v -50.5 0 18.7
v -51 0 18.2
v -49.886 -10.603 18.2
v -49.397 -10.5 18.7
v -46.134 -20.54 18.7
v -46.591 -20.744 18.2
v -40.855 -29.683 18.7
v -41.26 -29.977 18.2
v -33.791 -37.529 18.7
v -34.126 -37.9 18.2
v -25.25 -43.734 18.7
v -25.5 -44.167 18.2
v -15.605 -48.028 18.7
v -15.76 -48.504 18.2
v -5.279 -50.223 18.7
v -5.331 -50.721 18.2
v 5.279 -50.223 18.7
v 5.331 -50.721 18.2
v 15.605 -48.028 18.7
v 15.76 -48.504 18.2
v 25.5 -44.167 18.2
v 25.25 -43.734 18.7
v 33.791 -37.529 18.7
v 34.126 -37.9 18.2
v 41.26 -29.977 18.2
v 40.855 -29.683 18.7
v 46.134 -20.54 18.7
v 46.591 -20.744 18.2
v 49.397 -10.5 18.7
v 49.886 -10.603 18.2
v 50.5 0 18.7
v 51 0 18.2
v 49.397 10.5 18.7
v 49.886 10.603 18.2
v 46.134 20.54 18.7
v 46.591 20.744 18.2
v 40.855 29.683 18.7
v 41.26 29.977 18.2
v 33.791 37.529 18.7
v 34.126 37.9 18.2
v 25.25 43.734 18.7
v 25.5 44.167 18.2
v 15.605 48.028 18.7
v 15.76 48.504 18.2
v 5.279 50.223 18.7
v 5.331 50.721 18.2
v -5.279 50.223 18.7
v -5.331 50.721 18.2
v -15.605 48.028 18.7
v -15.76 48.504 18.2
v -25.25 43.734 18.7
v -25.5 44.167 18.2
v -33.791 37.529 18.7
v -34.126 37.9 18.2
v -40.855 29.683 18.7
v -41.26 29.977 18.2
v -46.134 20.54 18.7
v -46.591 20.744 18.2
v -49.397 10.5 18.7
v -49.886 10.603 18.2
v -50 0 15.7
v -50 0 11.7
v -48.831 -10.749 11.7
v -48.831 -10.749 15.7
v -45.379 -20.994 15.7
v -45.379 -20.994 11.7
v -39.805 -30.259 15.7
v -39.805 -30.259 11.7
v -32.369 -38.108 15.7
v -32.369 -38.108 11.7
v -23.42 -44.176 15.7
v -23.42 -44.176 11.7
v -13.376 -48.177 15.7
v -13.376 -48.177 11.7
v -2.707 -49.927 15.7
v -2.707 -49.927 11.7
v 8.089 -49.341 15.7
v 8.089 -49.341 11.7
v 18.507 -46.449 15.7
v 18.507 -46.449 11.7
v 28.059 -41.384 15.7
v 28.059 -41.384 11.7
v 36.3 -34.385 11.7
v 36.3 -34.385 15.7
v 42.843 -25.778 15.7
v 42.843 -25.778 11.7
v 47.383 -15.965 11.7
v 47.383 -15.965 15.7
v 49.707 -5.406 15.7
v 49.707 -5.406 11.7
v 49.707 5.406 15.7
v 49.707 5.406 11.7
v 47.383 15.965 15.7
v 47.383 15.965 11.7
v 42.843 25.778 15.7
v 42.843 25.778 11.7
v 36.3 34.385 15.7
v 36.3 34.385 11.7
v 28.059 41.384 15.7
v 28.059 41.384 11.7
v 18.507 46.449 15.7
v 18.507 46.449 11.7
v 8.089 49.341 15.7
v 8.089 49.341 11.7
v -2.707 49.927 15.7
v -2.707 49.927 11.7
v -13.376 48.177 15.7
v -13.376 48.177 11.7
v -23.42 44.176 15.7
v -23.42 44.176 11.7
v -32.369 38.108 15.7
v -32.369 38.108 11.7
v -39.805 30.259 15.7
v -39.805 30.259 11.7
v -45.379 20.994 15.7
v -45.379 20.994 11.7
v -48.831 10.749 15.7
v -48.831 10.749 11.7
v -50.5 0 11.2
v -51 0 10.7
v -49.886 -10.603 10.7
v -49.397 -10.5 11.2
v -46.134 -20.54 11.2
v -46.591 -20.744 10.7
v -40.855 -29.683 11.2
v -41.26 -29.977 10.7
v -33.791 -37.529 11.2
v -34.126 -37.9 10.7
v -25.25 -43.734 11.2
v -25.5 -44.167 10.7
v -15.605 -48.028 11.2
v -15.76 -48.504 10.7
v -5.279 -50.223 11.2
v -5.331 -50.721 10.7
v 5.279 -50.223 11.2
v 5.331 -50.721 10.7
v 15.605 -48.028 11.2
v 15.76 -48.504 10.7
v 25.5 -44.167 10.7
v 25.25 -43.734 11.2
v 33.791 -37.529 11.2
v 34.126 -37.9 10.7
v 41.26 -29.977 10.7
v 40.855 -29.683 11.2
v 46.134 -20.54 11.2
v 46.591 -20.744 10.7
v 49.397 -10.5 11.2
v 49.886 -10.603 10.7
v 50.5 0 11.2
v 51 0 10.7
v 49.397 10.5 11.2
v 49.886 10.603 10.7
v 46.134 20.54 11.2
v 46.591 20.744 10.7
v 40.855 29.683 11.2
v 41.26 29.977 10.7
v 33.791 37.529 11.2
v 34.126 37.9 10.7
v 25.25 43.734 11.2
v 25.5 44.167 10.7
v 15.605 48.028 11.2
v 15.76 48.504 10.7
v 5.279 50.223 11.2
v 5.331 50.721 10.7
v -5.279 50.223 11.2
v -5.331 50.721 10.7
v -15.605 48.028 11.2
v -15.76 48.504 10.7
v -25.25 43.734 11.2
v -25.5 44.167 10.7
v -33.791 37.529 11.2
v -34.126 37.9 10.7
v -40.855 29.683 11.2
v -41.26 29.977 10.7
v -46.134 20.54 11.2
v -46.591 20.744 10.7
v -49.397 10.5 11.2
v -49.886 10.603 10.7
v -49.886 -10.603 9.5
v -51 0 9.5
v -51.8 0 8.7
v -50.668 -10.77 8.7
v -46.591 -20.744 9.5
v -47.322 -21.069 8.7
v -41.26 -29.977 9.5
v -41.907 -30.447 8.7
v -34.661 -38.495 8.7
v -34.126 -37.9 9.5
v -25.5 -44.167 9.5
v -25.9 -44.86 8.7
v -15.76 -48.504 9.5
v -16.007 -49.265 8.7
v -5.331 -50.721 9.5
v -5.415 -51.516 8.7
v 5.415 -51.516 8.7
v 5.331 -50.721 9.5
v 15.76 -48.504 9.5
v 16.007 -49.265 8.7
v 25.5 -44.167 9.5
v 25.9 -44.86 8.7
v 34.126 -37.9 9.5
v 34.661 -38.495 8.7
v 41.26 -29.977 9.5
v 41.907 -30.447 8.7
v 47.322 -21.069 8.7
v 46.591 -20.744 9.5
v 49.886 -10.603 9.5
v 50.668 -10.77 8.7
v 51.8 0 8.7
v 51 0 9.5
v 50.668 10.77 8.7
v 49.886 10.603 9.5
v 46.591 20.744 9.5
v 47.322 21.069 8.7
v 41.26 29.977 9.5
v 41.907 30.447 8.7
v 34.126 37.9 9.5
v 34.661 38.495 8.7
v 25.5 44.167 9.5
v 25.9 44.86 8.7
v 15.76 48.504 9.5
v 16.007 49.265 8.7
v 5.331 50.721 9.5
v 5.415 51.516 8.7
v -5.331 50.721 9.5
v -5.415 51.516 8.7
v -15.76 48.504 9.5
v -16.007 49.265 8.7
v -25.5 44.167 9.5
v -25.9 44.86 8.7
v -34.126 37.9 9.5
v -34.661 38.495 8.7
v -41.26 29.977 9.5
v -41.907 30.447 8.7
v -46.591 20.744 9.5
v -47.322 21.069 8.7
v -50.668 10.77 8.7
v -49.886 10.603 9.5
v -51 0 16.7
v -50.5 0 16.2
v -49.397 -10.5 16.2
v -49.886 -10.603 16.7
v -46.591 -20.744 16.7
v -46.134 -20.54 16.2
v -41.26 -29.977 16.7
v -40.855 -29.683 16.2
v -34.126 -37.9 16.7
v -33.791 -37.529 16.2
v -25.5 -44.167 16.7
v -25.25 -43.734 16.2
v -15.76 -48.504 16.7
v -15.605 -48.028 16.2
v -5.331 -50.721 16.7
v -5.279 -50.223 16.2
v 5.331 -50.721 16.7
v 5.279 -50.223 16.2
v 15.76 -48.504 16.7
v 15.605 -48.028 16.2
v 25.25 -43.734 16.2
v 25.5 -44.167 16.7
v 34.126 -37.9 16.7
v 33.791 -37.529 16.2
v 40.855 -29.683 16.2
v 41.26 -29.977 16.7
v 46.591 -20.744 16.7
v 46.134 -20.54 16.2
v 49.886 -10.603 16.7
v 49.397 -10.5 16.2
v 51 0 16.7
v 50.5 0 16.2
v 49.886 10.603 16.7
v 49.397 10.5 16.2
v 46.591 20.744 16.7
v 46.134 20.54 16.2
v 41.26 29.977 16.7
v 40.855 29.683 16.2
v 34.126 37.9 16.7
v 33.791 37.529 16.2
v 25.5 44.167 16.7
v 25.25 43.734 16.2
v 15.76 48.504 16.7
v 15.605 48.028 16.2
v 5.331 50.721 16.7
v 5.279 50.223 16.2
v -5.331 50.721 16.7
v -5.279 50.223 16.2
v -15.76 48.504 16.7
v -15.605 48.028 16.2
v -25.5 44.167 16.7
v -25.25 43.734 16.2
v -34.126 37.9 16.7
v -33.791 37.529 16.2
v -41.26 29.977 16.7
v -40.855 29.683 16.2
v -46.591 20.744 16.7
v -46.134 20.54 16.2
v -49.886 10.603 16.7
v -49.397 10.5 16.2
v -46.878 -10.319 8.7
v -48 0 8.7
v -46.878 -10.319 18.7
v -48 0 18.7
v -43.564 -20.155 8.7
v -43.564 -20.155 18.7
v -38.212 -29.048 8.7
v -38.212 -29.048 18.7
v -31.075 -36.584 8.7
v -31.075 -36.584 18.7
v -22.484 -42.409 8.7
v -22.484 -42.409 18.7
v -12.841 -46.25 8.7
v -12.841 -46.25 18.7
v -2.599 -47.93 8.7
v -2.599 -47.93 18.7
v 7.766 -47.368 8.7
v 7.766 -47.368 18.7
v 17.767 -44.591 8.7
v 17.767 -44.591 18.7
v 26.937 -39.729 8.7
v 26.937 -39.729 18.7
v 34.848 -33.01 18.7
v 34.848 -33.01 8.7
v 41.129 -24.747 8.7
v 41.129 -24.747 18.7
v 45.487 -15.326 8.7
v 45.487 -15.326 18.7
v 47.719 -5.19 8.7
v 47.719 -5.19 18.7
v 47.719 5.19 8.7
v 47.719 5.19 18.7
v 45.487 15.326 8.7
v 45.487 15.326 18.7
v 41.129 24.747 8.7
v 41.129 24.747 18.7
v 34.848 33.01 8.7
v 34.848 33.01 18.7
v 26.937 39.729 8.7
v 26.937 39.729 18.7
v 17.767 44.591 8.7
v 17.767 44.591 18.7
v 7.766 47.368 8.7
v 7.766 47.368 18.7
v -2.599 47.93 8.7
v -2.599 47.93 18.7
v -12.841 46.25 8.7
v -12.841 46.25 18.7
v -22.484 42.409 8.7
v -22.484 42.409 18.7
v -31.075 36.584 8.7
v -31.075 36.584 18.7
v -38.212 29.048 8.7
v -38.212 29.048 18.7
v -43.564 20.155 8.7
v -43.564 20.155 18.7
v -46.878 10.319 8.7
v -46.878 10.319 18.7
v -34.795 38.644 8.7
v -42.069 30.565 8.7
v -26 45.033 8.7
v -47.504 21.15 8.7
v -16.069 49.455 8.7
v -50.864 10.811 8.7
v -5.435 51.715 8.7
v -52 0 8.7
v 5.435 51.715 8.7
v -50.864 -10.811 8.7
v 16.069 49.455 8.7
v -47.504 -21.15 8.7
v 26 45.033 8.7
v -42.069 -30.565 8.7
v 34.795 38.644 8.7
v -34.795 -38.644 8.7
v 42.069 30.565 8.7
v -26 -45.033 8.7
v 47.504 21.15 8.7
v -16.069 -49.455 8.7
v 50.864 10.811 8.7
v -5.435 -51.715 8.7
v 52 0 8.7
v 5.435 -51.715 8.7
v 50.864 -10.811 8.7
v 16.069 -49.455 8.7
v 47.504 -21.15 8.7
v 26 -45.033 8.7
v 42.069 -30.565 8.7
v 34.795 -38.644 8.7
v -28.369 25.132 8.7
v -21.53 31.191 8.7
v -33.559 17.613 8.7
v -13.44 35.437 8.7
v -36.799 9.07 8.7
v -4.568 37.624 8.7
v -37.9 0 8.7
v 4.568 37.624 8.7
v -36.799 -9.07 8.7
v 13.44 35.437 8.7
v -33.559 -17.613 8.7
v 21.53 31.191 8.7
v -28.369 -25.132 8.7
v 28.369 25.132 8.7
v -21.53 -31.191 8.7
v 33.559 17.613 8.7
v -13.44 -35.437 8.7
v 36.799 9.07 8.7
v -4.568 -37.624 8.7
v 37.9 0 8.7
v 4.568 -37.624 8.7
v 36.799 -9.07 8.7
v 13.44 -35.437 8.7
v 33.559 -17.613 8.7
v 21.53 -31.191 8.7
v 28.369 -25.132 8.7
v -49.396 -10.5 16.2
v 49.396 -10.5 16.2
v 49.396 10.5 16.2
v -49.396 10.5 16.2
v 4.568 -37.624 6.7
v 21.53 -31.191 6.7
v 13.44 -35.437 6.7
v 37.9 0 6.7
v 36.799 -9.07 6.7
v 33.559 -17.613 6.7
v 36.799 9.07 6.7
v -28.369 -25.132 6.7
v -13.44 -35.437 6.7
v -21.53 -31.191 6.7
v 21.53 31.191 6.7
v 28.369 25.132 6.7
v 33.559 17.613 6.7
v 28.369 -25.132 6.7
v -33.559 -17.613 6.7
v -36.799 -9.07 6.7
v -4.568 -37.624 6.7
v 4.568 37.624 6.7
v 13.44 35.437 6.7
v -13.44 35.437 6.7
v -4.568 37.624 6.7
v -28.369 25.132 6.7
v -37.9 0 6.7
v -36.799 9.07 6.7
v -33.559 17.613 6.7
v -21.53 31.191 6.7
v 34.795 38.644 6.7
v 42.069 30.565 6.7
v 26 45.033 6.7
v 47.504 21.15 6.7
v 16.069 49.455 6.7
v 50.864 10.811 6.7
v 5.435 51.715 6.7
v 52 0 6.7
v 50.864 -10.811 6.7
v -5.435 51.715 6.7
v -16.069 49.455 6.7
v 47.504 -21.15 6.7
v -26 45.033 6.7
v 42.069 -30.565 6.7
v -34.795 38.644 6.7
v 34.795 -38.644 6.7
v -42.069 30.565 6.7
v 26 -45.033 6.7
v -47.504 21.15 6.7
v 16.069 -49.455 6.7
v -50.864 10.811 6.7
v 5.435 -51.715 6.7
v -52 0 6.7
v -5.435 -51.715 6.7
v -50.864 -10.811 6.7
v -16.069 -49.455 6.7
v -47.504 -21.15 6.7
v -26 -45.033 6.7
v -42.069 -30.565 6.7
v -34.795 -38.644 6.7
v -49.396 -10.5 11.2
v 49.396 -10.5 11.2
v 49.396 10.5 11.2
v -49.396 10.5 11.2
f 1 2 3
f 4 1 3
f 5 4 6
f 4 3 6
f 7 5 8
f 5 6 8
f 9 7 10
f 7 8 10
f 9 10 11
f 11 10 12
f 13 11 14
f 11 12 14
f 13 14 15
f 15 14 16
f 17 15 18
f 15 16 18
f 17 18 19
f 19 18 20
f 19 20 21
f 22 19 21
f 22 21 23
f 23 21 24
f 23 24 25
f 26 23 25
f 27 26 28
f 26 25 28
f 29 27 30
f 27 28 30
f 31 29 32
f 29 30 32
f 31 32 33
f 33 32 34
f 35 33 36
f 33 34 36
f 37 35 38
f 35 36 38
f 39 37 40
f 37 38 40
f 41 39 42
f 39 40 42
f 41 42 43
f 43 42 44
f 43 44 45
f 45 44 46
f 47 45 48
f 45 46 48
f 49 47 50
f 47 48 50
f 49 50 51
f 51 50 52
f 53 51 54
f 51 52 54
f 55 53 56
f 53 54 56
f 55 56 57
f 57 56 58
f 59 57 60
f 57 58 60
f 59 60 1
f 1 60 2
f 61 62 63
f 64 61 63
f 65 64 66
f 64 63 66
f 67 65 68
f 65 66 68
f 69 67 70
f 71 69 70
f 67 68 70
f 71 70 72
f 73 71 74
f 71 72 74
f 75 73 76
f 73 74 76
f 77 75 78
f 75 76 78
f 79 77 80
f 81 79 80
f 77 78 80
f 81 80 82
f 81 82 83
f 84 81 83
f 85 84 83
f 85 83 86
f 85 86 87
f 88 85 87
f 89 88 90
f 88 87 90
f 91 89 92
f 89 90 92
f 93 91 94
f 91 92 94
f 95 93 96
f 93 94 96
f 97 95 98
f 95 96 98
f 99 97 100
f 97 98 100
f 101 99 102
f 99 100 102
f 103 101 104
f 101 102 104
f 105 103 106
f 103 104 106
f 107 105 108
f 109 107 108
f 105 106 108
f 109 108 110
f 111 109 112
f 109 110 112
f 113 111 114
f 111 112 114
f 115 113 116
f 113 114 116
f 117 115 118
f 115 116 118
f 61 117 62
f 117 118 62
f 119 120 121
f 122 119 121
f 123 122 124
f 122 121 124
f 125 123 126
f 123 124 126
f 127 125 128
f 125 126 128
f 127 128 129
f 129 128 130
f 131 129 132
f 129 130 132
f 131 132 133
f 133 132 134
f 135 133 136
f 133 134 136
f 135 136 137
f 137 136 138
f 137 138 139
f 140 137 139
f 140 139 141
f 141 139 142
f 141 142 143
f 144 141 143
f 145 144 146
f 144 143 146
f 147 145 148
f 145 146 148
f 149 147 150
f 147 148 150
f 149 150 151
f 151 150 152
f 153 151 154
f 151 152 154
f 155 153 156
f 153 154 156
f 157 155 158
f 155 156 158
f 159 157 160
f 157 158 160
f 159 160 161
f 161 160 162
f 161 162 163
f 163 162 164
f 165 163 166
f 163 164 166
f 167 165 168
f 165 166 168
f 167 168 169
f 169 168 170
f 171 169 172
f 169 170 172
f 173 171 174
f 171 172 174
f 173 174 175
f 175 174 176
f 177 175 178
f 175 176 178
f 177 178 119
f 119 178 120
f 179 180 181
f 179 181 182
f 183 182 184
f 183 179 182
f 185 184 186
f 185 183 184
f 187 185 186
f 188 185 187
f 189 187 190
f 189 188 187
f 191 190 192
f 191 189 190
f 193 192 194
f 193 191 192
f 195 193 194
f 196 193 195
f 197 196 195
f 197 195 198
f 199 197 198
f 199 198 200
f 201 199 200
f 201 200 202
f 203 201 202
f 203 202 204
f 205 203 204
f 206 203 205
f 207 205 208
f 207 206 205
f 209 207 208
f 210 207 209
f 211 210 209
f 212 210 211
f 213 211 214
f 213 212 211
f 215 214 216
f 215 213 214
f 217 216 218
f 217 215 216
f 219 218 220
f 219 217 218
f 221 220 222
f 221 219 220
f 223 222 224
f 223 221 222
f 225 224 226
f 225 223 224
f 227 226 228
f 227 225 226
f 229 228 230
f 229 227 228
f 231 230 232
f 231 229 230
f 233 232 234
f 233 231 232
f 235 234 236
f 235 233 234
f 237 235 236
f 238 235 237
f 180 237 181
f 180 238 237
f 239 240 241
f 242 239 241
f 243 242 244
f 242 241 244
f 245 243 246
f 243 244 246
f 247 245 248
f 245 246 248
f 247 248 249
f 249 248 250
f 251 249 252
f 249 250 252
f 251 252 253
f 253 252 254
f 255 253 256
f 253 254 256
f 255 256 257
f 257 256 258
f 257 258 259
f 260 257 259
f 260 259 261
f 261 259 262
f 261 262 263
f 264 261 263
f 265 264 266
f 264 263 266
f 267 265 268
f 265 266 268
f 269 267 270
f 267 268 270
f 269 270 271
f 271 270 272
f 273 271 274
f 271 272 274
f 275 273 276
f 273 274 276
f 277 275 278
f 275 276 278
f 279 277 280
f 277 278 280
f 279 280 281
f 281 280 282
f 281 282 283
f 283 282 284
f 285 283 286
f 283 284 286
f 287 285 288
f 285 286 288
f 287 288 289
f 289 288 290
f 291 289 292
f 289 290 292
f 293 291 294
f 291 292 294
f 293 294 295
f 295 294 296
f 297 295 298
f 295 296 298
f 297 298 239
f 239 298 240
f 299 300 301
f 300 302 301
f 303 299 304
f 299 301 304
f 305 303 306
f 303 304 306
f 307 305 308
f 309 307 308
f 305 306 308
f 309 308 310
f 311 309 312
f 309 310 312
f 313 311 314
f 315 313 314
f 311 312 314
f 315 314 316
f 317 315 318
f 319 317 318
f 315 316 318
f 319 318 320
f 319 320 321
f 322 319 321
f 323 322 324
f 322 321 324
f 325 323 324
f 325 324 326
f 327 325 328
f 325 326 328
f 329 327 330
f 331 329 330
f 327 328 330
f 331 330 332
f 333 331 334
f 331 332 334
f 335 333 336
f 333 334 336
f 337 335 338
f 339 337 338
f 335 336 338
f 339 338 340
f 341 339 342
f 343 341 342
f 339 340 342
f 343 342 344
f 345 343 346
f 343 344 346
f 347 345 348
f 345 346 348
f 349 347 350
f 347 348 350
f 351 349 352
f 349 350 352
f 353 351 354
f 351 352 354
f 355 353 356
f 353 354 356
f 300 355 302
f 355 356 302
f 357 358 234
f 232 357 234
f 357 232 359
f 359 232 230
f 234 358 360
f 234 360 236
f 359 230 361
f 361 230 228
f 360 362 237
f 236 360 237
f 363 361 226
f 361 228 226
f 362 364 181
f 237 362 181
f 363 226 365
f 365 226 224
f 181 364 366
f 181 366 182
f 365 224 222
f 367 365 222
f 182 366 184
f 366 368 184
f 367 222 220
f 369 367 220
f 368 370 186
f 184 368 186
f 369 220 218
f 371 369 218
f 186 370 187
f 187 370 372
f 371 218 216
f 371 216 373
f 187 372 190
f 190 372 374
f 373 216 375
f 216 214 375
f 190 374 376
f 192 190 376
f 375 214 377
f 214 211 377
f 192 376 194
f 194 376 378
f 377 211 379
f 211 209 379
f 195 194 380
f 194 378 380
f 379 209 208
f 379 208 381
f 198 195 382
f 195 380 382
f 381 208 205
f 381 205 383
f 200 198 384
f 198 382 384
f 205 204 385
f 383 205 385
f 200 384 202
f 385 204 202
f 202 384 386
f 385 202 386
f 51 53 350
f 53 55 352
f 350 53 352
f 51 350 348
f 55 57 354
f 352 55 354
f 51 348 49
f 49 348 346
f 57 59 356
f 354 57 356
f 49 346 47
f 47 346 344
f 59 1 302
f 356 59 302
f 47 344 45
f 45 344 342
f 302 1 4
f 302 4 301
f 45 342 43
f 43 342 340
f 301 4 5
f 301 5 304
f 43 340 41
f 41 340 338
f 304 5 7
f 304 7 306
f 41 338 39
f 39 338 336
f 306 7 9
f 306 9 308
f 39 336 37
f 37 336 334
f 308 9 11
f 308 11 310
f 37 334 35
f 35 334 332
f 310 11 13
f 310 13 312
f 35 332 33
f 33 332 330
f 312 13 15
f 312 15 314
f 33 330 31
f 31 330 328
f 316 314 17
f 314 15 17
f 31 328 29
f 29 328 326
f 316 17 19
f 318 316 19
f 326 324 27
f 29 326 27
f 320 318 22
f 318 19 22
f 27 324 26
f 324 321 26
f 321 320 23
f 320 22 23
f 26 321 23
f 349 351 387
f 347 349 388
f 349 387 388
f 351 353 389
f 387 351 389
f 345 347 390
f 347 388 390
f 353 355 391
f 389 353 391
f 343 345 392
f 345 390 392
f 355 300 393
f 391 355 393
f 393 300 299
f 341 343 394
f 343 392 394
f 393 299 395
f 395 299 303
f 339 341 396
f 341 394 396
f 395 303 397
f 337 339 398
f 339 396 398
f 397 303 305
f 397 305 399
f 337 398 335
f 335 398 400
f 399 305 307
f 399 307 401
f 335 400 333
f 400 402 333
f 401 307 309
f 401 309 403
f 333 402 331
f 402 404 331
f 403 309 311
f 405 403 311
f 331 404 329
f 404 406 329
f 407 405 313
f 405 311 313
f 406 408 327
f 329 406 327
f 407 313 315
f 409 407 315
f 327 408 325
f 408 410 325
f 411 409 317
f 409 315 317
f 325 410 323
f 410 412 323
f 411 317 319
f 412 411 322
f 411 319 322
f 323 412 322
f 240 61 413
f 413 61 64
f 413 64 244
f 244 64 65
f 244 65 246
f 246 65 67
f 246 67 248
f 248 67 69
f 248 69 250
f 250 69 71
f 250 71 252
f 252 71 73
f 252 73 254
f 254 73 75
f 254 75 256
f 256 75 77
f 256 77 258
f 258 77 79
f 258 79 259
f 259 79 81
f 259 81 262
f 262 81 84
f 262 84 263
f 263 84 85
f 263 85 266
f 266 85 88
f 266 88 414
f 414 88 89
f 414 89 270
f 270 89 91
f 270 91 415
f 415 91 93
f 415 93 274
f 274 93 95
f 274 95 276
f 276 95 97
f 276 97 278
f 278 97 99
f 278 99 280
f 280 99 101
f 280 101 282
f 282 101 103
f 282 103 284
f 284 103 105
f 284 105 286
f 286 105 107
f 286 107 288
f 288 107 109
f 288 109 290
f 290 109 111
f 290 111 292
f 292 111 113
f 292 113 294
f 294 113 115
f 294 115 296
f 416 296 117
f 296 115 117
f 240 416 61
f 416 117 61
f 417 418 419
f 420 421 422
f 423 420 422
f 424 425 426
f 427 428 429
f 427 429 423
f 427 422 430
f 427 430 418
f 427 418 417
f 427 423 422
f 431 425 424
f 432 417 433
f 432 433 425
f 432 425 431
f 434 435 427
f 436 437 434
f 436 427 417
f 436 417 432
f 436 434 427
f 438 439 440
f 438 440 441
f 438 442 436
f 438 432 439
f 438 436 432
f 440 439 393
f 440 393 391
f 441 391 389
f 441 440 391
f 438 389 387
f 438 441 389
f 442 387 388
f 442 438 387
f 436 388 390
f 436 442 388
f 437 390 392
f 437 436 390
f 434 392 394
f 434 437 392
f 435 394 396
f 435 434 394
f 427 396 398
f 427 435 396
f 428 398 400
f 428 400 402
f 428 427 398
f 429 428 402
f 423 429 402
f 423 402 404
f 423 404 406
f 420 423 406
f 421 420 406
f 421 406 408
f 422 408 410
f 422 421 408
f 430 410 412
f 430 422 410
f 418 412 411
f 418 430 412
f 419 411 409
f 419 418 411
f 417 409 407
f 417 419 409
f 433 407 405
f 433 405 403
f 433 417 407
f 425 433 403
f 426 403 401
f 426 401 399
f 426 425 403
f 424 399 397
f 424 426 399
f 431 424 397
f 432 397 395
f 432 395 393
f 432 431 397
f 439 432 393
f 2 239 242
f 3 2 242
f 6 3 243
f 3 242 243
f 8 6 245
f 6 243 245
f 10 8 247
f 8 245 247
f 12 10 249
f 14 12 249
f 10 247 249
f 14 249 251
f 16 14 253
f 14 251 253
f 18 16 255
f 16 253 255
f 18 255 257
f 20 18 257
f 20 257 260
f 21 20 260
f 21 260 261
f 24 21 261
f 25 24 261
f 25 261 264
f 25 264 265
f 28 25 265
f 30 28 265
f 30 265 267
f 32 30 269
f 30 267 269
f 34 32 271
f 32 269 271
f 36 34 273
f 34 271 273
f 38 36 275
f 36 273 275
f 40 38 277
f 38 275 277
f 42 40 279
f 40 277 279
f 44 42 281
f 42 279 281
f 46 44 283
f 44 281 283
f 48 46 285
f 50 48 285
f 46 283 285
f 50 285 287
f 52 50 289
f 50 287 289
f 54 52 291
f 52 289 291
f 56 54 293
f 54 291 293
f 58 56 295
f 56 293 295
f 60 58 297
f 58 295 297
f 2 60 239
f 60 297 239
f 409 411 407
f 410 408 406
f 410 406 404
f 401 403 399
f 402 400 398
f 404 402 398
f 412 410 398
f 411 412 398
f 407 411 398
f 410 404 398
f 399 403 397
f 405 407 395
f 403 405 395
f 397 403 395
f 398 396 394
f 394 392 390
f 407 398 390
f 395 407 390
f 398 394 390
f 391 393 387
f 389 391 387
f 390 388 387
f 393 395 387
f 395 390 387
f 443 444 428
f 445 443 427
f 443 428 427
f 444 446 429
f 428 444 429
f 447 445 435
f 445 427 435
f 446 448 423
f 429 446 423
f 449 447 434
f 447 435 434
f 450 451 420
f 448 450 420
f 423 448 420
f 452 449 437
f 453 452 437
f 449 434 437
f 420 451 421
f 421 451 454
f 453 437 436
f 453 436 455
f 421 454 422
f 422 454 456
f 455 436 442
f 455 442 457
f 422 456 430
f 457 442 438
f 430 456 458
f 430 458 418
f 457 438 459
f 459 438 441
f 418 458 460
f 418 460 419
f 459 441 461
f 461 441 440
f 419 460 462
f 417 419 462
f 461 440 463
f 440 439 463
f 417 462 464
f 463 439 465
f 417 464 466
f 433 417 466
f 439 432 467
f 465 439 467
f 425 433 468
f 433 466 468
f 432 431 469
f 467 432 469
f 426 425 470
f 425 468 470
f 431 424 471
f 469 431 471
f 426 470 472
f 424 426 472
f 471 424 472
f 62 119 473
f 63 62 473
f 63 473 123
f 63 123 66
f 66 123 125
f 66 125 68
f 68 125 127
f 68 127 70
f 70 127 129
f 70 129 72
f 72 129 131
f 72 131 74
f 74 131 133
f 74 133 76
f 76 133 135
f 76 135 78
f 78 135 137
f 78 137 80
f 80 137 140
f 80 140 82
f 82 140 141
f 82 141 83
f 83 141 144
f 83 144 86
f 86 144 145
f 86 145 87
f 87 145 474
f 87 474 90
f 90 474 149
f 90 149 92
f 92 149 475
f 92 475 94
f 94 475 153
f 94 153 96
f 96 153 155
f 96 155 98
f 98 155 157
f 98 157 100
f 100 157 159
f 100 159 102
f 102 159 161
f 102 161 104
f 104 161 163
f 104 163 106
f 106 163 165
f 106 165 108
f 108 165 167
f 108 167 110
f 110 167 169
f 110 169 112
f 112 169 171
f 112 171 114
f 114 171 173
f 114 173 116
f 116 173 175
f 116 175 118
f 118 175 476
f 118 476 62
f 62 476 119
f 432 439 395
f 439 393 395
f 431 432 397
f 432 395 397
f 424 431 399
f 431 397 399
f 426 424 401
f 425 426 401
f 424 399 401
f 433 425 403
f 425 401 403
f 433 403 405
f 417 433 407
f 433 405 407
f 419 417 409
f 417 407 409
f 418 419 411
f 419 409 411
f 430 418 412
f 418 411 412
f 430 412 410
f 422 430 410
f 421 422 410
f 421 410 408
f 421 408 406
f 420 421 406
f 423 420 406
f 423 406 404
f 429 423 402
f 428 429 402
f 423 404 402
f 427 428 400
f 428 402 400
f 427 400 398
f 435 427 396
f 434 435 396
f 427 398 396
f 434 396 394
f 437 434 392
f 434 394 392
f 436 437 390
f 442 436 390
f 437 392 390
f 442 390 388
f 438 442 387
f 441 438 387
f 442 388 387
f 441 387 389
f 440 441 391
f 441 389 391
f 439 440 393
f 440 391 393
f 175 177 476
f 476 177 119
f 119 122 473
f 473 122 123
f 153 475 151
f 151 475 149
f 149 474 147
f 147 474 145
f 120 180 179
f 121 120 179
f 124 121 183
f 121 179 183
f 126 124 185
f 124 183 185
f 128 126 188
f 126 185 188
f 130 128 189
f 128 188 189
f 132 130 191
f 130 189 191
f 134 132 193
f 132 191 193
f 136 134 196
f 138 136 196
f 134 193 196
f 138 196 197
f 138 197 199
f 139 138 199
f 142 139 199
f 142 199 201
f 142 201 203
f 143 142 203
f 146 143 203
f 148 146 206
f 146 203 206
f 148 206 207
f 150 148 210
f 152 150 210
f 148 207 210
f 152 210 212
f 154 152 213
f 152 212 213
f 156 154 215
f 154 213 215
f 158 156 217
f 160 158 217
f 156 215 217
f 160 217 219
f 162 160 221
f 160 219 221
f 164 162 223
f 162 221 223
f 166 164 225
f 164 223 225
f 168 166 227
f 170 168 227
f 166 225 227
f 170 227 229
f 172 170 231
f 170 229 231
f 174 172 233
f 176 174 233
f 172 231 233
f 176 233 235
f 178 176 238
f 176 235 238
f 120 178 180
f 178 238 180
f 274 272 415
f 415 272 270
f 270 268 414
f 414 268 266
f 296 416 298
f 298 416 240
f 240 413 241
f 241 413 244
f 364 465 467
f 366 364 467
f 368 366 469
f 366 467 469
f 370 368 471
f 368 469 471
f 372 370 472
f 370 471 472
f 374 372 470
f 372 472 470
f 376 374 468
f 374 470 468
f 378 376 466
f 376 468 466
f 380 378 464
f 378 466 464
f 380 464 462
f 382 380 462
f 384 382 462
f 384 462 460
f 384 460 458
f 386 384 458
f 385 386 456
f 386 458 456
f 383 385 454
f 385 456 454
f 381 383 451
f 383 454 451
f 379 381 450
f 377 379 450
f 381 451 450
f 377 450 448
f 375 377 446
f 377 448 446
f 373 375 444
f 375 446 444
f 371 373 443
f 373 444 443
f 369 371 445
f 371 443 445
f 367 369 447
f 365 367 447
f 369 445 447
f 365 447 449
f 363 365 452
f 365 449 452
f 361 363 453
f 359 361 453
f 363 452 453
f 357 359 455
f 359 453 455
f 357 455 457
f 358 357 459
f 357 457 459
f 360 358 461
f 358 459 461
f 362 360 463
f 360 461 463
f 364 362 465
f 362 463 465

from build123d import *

# Parameters (mm, degrees)
CHAMFER1_SIZE           = 0.5
CHAMFER2_SIZE           = 0.8
CUT_EXTRUDE1_DEPTH      = 76.879443857
CUT_EXTRUDE1_DEPTH_BACK = 76.879443857
SKETCH3_W               = 104.560873996
SKETCH3_H               = 26.139248716
SKETCH4_R               = 37.9
BOSS_EXTRUDE1_DEPTH     = 2


with BuildPart() as part:
    # Sketch1 → Revolve1 (revolve)
    with BuildSketch(Plane(origin=(0, 0, 0), x_dir=(1, 0, 0), z_dir=(0, 1, 0)), mode=Mode.PRIVATE) as revolve1_sk:
        Polygon((37.9, 0), (37.9, -8.7), (48, -8.7), (48, -18.7), (51, -18.7), (51, -16.2), (50, -16.2), (50, -11.2), (51, -11.2), (51, -8.7), (52, -8.7), (52, -6.7), (39.9, -6.7), (39.9, 0), align=None)
    revolve(revolve1_sk.sketch.rotate(Axis((0, 0, -73.981367368), (0, 0, 1)), 180), axis=Axis((0, 0, -73.981367368), (0, 0, 1)))

    # Chamfer1
    chamfer1_edges = [part.edges().sort_by_distance(p)[0] for p in [
        (51, 0, 11.2),
        (50, 0, 11.2),
        (50, 0, 16.2),
        (51, 0, 16.2),
        (51, 0, 18.7),
        (39.9, 0, 0),
    ]]
    chamfer(chamfer1_edges, length=CHAMFER1_SIZE - 0.0001)  # a hair under: the kernel refuses the full size

    # Chamfer2
    chamfer2_edges = [part.edges().sort_by_distance(p)[0] for p in [
        (51, 0, 8.7),
    ]]
    chamfer(chamfer2_edges, length=CHAMFER2_SIZE)

    # Sketch3 → Cut-Extrude1 (cut, two sides: drawn at the far end of the back side and taken through both)
    with BuildSketch(Plane(origin=(0, 0, 0), x_dir=(1, 0, 0), z_dir=(0, 1, 0)).offset(-CUT_EXTRUDE1_DEPTH_BACK)):
        with Locations((3.61950671, 6.369624358)):
            Rectangle(SKETCH3_W, SKETCH3_H)
    extrude(amount=CUT_EXTRUDE1_DEPTH + CUT_EXTRUDE1_DEPTH_BACK, mode=Mode.SUBTRACT)


with BuildPart() as body_2:
    # Sketch4 → Boss-Extrude1 (new body)
    with BuildSketch(Plane(origin=(0, 0, 6.7), x_dir=(-1, 0, 0), z_dir=(0, 0, -1))):
        Circle(SKETCH4_R)
    extrude(amount=-BOSS_EXTRUDE1_DEPTH)


solid = Compound([part.part, body_2.part])
